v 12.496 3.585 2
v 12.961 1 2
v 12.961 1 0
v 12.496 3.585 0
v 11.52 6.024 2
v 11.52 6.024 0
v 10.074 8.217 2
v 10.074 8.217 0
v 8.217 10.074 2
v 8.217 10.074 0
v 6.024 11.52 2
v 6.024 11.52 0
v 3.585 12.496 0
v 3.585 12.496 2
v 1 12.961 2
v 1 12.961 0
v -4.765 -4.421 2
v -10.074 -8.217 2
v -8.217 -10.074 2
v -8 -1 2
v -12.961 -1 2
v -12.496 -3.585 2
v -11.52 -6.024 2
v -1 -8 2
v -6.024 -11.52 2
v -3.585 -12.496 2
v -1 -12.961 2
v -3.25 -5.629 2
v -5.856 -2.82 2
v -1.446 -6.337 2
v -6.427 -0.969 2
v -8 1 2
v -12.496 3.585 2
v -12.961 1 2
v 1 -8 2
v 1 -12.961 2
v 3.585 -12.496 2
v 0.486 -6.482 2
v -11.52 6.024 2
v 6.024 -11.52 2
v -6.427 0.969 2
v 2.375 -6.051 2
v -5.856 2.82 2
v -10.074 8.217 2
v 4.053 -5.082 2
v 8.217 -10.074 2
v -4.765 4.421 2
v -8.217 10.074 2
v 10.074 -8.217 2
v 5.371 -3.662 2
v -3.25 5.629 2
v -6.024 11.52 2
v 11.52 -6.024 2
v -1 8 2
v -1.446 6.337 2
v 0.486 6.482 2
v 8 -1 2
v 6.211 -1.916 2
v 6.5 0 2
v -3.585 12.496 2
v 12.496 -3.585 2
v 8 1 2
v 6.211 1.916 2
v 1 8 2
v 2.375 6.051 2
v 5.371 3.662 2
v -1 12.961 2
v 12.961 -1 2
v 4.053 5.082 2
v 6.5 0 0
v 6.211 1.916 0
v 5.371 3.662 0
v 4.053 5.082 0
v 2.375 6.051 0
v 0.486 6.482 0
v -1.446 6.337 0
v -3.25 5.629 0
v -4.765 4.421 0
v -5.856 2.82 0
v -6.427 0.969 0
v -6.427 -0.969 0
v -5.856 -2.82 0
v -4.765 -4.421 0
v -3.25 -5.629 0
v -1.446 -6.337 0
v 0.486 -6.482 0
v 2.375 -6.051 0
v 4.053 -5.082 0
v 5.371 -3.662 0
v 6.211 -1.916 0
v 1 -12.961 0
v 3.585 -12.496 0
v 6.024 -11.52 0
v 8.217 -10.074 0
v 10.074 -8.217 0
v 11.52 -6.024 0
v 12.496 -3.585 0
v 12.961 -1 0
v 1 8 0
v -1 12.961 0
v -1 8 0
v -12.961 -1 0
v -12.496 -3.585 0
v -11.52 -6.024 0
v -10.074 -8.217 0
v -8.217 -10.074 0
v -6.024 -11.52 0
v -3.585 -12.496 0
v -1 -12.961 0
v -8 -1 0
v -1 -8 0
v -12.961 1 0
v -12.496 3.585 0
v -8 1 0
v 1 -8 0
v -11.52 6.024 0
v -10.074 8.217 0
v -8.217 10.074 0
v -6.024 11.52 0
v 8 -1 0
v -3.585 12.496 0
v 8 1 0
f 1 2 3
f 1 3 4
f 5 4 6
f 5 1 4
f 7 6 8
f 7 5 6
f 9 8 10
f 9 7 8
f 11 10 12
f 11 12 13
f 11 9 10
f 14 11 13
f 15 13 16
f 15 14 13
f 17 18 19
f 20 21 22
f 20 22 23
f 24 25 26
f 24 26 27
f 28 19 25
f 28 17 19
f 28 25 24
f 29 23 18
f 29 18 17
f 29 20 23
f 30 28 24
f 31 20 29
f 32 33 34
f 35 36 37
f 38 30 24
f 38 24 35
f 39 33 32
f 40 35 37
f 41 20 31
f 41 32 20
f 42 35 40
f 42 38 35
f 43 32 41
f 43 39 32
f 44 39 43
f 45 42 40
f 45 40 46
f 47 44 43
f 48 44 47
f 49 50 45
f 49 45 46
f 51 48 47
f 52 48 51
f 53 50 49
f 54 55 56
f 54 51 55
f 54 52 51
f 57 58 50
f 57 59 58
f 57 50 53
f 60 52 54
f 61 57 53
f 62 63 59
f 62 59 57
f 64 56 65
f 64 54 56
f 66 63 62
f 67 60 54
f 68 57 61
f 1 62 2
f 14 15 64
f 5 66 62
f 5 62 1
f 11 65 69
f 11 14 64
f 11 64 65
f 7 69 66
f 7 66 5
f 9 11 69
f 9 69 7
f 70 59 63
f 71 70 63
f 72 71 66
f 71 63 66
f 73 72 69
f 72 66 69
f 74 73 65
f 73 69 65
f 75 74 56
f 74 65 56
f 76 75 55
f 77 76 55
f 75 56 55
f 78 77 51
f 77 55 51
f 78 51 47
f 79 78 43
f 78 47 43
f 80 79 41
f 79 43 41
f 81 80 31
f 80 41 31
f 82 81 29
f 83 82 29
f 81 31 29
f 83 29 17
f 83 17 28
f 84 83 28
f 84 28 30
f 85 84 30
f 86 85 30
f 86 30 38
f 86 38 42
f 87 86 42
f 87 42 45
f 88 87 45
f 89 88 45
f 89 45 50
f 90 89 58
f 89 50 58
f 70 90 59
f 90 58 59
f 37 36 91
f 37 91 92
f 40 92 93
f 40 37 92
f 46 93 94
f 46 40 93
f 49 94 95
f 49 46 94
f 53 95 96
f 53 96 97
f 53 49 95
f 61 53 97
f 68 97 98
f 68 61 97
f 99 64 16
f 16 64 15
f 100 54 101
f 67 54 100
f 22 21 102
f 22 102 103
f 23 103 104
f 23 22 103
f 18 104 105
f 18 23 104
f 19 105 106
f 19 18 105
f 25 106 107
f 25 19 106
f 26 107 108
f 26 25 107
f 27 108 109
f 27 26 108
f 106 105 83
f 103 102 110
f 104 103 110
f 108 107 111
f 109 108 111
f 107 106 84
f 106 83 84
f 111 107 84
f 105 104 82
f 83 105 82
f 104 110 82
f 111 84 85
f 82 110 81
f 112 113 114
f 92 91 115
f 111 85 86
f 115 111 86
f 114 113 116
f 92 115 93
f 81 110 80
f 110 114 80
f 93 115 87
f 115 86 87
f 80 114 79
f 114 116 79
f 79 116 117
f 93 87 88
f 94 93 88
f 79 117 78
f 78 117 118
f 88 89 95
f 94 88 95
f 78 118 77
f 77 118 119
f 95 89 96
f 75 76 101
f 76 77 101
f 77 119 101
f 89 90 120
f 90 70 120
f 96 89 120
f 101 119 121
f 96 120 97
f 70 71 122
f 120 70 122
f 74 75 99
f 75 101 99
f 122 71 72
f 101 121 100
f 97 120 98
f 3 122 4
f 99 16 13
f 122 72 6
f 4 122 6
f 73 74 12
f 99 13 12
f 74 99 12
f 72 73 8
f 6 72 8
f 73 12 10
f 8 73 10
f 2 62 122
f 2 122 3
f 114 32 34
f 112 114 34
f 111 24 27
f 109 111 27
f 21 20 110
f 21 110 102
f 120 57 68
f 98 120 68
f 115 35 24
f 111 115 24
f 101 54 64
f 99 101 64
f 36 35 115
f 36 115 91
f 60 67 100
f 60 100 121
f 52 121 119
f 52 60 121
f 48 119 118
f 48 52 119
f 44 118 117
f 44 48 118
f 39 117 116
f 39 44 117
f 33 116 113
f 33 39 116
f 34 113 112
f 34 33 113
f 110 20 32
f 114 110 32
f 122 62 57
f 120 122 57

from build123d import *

# Parameters (mm, degrees)
SKETCH003_R           = 2.3
SKETCH003_W           = 2
SKETCH003_H           = 5
EXTRUDE003_DEPTH      = 5
EXTRUDE003_DEPTH_BACK = 3
ARRAY001_COUNT        = 4
SKETCH012_R           = 13
SKETCH012_R_2         = 6.5
EXTRUDE012_DEPTH      = 2


with BuildPart() as body:
    # Sketch003 → Extrude003 (new body, two sides)
    with BuildSketch(Plane.XY) as extrude003_sk:
        with Locations((0, 38.25)):
            Circle(SKETCH003_R)
        with Locations((0, 10.5)):
            Rectangle(SKETCH003_W, SKETCH003_H)
    extrude(amount=EXTRUDE003_DEPTH)
    extrude(extrude003_sk.sketch, amount=-EXTRUDE003_DEPTH_BACK)

    # Array001: Body ×4 about axis
    array001_axis = Axis((0, 0, 0), (0, 0, 1))


with BuildPart() as body_1:
    add(body.part)
    for i in range(1, ARRAY001_COUNT):
        add(body.part.rotate(array001_axis, i * 360 / ARRAY001_COUNT))


with BuildPart() as cut003:
    # Sketch012 → Extrude012 (new body)
    with BuildSketch(Plane.XY.offset(2)):
        Circle(SKETCH012_R)
        Circle(SKETCH012_R_2, mode=Mode.SUBTRACT)
    extrude(amount=-EXTRUDE012_DEPTH)

    # Cut003: cut Body
    add(body_1.part, mode=Mode.SUBTRACT)


solid = cut003.part
